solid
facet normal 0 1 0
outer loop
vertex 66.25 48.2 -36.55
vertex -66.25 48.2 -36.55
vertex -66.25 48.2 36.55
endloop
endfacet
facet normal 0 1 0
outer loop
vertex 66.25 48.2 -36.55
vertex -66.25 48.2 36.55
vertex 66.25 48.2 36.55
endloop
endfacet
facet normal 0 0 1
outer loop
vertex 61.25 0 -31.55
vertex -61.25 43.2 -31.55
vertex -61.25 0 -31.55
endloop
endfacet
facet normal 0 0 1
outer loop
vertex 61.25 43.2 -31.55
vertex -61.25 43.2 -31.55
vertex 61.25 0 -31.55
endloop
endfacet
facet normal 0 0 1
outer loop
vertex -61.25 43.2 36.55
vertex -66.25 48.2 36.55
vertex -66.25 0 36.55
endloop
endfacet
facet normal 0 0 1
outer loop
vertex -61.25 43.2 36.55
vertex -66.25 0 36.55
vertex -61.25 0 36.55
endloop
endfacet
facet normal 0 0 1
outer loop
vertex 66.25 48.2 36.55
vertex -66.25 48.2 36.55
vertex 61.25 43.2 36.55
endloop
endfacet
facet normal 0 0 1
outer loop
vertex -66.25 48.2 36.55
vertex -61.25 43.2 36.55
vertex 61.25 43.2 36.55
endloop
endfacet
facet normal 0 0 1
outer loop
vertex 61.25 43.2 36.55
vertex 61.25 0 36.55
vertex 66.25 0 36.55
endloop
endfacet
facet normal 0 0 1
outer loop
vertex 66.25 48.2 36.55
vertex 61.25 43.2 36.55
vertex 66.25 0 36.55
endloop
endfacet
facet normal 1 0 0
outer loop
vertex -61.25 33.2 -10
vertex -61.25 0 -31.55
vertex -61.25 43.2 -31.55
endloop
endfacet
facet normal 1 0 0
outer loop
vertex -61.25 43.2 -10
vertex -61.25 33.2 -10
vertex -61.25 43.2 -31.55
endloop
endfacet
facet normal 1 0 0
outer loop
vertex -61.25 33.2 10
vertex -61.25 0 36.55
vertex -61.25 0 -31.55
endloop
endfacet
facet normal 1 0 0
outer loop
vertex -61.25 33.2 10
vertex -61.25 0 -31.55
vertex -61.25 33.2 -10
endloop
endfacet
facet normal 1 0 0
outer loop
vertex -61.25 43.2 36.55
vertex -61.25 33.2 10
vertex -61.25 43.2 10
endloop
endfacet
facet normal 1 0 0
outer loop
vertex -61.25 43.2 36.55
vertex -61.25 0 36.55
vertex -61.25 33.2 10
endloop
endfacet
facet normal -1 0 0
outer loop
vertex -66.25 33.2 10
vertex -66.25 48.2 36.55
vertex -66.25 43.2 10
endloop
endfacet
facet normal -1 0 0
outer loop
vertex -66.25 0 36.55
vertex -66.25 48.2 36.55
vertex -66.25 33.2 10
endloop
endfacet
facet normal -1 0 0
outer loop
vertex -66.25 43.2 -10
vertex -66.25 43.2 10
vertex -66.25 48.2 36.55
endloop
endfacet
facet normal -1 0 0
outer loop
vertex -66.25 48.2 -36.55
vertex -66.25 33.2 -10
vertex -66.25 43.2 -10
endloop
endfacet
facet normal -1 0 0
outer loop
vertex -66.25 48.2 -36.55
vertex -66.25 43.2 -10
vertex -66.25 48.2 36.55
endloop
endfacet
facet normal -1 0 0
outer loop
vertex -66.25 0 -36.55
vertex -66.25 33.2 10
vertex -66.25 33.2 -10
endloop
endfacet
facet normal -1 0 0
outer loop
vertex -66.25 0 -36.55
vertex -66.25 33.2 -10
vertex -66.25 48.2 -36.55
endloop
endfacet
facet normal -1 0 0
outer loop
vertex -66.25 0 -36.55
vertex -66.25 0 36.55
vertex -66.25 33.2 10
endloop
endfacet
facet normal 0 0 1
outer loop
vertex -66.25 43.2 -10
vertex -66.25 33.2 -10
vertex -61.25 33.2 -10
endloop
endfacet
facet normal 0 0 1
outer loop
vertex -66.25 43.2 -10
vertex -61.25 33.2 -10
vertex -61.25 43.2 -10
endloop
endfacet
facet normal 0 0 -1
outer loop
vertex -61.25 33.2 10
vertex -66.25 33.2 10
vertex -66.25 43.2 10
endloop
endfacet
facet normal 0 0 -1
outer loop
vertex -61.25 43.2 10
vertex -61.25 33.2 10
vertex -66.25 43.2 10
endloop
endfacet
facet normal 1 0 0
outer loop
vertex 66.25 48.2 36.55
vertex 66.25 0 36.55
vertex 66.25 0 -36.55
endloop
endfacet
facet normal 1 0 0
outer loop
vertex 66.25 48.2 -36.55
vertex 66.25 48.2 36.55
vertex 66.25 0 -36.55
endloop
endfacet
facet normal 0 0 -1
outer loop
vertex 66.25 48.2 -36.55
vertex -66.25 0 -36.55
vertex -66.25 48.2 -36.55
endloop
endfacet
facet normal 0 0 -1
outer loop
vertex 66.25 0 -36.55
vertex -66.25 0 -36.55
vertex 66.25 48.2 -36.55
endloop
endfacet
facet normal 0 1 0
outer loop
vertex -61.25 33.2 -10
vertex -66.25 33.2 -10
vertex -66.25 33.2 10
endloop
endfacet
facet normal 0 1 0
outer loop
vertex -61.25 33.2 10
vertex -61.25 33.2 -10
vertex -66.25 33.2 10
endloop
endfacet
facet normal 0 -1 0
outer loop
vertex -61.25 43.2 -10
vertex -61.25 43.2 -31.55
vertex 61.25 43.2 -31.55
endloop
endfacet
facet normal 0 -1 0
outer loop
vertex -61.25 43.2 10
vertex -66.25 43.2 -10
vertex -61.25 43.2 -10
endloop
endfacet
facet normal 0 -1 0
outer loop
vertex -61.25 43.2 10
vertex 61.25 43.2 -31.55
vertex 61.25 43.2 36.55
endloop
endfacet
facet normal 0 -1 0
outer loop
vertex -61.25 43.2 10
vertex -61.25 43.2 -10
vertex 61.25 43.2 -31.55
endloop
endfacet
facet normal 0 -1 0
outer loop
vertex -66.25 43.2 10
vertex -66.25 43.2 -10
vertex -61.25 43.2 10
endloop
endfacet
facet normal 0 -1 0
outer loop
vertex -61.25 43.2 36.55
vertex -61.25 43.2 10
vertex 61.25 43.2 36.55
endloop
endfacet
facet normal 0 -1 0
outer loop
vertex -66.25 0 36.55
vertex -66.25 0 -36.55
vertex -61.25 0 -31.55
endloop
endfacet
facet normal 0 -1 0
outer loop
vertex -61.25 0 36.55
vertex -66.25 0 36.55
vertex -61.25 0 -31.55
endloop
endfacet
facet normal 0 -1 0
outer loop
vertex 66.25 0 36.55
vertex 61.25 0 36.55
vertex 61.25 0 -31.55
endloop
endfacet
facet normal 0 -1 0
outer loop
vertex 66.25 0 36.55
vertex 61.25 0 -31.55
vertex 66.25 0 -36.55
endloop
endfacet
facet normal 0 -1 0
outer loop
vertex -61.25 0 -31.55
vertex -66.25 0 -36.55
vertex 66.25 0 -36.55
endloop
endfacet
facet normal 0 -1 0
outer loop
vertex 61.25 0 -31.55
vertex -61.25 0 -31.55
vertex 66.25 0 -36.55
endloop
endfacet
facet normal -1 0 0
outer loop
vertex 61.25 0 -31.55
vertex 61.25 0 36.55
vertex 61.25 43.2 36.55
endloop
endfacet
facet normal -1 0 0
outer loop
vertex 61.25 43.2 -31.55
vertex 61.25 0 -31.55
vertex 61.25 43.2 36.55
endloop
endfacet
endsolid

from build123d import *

# Parameters (mm, degrees)
SKETCH_1_W          = 132.5
SKETCH_1_H          = 73.1
EXTRUDE_1_DEPTH     = 48.2
SKETCH_3_W          = 122.5
SKETCH_3_H          = 43.2
CUT_EXTRUDE_1_DEPTH = 68.1
SKETCH_6_W          = 20
SKETCH_6_H          = 10
CUT_EXTRUDE_2_DEPTH = 5


with BuildPart() as part:
    # 草圖1 → 填料-伸長1 (new body)
    with BuildSketch(Plane(origin=(0, 0, 0), x_dir=(1, 0, 0), z_dir=(0, 1, 0))):
        Rectangle(SKETCH_1_W, SKETCH_1_H)
    extrude(amount=EXTRUDE_1_DEPTH)

    # 草圖3 → 除料-伸長1 (cut)
    with BuildSketch(Plane.XY.offset(36.55)):
        with Locations((0, 21.6)):
            Rectangle(SKETCH_3_W, SKETCH_3_H)
    extrude(amount=-CUT_EXTRUDE_1_DEPTH, mode=Mode.SUBTRACT)

    # 草圖6 → 除料-伸長2 (cut)
    with BuildSketch(Plane.ZY.offset(66.25)):
        with Locations((0, 38.2)):
            Rectangle(SKETCH_6_W, SKETCH_6_H)
    extrude(amount=-CUT_EXTRUDE_2_DEPTH, mode=Mode.SUBTRACT)


solid = part.part
